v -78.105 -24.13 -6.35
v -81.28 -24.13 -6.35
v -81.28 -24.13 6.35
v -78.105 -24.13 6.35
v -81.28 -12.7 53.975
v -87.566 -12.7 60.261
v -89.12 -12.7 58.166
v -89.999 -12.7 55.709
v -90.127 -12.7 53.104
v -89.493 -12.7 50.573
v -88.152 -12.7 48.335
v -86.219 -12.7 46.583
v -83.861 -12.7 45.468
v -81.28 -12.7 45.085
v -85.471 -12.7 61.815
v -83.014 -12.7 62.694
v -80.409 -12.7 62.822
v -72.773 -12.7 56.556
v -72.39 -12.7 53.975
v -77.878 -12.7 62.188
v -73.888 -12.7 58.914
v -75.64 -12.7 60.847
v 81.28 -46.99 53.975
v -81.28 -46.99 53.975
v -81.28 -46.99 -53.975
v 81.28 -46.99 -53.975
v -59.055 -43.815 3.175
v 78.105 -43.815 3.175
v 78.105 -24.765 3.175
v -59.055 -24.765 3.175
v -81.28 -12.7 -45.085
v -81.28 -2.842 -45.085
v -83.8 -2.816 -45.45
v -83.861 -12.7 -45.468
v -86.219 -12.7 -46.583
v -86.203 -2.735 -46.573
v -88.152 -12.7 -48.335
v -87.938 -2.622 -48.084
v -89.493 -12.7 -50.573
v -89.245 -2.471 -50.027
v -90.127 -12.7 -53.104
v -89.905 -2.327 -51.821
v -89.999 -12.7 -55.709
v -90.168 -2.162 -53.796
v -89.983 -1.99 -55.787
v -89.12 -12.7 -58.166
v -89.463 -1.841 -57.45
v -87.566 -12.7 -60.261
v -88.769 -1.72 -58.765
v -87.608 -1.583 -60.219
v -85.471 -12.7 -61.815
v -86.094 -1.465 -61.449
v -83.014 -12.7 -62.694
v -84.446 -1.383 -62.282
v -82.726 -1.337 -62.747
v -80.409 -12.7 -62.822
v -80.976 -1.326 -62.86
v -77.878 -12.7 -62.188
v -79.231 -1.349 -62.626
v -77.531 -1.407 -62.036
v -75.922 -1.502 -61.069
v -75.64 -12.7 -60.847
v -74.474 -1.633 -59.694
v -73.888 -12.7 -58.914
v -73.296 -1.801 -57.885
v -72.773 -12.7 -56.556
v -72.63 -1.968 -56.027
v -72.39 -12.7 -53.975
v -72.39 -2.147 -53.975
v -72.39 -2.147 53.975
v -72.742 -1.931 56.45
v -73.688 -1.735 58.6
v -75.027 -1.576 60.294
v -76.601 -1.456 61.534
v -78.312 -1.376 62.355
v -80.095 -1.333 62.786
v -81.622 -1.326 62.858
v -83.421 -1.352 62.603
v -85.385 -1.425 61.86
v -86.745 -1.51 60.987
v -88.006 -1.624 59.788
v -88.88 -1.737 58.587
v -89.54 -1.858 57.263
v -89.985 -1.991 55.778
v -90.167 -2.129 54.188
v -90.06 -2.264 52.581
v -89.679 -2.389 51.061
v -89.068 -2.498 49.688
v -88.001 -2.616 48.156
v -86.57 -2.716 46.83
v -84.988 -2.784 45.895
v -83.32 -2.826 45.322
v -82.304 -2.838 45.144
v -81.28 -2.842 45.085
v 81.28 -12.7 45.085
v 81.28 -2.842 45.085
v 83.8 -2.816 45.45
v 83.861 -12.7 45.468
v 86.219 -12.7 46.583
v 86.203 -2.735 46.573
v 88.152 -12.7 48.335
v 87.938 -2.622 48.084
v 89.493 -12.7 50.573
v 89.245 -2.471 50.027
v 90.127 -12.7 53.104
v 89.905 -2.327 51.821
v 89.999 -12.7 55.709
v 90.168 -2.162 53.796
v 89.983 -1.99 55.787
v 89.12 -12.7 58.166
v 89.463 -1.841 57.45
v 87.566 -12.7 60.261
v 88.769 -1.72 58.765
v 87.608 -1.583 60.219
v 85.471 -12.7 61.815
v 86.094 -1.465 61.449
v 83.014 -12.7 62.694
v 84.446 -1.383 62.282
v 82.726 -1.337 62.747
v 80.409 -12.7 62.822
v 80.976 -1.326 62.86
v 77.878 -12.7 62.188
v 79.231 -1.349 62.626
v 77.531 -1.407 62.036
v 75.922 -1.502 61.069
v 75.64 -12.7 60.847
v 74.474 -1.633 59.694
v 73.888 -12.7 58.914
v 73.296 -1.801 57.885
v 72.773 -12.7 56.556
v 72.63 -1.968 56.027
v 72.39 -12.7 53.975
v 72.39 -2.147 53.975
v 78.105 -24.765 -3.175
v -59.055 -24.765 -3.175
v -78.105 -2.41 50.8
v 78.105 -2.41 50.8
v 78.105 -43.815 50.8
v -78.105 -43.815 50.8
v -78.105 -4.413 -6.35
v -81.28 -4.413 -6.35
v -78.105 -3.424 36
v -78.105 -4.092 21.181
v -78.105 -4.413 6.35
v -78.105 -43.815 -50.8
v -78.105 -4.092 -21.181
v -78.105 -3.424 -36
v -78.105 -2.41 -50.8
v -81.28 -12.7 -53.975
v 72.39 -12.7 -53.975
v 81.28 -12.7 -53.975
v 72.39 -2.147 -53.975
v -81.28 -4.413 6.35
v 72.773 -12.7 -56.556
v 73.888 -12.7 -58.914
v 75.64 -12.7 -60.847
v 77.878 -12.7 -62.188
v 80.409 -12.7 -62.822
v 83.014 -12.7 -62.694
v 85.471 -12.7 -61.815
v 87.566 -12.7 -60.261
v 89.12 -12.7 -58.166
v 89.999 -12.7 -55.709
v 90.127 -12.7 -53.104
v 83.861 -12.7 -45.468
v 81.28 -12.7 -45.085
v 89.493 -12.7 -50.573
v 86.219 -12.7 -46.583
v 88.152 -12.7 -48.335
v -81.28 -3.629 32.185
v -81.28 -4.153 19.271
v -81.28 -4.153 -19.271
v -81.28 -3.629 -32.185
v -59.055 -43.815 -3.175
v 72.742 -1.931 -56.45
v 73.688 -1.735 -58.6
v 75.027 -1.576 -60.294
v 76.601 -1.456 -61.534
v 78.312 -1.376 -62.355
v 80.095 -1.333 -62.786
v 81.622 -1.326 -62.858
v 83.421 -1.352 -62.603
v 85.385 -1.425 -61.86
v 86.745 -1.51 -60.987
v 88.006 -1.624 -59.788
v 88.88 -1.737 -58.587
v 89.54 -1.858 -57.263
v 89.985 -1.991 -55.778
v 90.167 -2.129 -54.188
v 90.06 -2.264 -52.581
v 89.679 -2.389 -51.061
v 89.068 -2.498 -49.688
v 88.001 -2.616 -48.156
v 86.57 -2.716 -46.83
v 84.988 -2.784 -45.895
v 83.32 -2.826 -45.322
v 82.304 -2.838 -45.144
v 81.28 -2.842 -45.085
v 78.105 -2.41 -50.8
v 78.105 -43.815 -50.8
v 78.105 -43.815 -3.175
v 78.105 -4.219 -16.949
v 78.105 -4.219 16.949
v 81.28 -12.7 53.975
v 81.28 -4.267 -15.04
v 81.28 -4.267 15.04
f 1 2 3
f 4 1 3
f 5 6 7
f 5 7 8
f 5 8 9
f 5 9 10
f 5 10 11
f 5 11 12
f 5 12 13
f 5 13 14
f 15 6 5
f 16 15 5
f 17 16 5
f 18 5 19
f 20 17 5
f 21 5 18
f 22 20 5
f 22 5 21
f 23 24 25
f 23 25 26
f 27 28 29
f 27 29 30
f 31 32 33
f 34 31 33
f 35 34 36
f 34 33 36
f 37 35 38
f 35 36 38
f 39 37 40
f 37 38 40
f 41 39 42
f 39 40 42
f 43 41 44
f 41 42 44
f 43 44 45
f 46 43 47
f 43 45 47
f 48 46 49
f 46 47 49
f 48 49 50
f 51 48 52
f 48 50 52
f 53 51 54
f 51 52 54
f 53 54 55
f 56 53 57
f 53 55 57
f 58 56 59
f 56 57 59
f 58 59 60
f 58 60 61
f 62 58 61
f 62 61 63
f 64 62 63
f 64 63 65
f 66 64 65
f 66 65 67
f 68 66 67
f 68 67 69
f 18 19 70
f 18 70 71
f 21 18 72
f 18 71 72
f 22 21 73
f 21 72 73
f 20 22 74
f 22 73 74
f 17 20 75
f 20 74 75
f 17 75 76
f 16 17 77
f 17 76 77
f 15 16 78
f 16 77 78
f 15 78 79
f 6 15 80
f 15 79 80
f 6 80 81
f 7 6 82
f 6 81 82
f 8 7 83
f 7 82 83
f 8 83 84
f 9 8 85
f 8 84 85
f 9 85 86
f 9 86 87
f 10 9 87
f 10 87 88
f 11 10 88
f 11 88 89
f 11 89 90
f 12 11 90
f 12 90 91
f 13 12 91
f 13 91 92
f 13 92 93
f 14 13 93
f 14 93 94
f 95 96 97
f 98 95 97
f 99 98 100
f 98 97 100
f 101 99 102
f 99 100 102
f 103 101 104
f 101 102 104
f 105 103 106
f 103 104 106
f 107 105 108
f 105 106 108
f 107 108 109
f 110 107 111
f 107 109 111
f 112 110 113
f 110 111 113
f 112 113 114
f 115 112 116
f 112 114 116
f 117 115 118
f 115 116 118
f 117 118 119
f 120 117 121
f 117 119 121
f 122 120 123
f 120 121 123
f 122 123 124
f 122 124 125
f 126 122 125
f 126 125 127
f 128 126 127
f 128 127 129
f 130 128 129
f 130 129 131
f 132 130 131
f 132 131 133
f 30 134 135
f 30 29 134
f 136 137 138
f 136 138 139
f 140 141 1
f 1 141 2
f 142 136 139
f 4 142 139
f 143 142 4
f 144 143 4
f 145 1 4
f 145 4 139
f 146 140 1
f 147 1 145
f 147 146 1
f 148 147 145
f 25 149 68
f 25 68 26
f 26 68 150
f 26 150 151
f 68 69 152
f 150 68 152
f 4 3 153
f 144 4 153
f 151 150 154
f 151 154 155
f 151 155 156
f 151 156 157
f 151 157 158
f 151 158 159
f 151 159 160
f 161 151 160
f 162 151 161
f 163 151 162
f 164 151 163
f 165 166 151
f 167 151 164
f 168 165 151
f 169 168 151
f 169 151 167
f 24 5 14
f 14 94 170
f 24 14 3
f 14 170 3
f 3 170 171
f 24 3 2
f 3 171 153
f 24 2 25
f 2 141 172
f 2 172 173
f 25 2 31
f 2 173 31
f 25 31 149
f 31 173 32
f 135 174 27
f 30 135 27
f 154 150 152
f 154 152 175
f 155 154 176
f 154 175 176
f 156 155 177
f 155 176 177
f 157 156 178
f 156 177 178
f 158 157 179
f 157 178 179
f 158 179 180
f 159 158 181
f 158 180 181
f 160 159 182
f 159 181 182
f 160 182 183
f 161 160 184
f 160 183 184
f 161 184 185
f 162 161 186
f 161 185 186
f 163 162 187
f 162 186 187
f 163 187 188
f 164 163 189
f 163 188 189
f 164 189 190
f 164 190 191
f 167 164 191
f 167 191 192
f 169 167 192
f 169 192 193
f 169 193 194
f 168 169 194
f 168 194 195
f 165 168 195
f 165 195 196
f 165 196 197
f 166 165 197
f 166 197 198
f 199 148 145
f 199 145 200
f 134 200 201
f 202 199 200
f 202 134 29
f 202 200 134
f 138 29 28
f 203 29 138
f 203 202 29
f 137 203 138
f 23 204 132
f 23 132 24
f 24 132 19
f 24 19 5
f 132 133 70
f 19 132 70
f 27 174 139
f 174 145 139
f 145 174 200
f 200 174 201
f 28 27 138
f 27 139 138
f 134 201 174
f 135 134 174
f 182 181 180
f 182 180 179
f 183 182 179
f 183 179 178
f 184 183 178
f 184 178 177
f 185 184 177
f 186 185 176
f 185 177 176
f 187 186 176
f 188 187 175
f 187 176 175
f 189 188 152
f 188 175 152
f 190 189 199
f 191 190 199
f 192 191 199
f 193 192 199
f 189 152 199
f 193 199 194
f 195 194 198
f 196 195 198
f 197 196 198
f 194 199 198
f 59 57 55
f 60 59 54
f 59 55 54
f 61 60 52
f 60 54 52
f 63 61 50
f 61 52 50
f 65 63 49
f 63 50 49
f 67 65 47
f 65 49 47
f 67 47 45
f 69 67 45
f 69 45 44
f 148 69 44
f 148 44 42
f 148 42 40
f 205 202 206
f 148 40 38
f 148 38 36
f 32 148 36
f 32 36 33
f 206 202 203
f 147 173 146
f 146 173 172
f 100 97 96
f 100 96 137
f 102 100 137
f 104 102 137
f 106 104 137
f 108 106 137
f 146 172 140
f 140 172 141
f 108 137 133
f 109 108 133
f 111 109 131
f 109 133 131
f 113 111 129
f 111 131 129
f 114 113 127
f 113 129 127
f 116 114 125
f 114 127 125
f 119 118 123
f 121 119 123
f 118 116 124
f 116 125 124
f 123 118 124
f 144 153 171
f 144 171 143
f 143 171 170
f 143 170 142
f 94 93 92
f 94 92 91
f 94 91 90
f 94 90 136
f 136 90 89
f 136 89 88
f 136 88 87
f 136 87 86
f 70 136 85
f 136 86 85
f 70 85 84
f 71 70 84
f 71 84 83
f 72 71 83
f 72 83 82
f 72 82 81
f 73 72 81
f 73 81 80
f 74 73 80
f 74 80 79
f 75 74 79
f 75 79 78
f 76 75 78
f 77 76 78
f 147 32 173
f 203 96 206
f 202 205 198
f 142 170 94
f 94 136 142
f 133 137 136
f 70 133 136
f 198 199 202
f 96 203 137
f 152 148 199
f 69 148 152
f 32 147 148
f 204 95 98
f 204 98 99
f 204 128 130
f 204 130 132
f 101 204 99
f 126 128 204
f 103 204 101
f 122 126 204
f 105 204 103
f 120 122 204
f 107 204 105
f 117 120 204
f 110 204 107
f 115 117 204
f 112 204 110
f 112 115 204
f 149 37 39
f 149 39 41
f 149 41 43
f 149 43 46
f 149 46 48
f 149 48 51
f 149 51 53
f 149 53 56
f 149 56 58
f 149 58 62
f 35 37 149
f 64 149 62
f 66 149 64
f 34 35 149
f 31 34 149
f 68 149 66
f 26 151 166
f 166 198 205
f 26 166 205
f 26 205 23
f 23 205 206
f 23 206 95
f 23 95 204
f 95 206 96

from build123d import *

# Parameters (mm, degrees)
F1_DEPTH  = 46.99
F2_T      = -3.175
F5_DEPTH  = 12.7
F6_R      = 635
F7_DEPTH  = 279.4
F8_DEPTH  = 3.175
F9_W      = 137.16
F9_H      = 3.175
F10_DEPTH = 19.05


# Not quite as in the source:
# - a feature names something its author has since deleted; it is built from what else it names


with BuildPart() as f1:
    # F0 (on Front) → F1 (new body)
    with BuildSketch(Plane.XZ):
        Polygon((-72.39, 53.975), (-81.28, 53.975), (-81.28, 45.085), (-81.28, -45.085), (-81.28, -53.975), (-72.39, -53.975), (72.39, -53.975), (81.28, -53.975), (81.28, -45.085), (81.28, 45.085), (81.28, 53.975), (72.39, 53.975), align=None)
    extrude(amount=F1_DEPTH)

    # F2
    f2_openings = [f1.faces().sort_by_distance(p)[0] for p in [
        (0, 0, 0),
    ]]
    offset(amount=F2_T, openings=f2_openings)

    # F0 (on Front) → F5 (join)
    with BuildSketch(Plane.XZ):
        with BuildLine():
            Line((-81.28, 45.085), (-81.28, 53.975))
            Line((-81.28, 53.975), (-72.39, 53.975))
            ThreePointArc((-72.39, 53.975), (-87.5661792847, 60.2611792847), (-81.28, 45.085))
        make_face()
        with BuildLine():
            Line((-81.28, -53.975), (-81.28, -45.085))
            ThreePointArc((-81.28, -45.085), (-87.5661792847, -60.2611792847), (-72.39, -53.975))
            Line((-72.39, -53.975), (-81.28, -53.975))
        make_face()
        with BuildLine():
            ThreePointArc((81.28, 45.085), (87.5661792847, 60.2611792847), (72.39, 53.975))
            Line((72.39, 53.975), (81.28, 53.975))
            Line((81.28, 53.975), (81.28, 45.085))
        make_face()
        with BuildLine():
            ThreePointArc((72.39, -53.975), (87.5661792847, -60.2611792847), (81.28, -45.085))
            Line((81.28, -45.085), (81.28, -53.975))
            Line((81.28, -53.975), (72.39, -53.975))
        make_face()
    extrude(amount=F5_DEPTH)

    # F6 (on offset) → F7 (cut)
    with BuildSketch(Plane(origin=(-106.68, 0, 0), x_dir=(0, -1, 0), z_dir=(-1, 0, 0))):
        with Locations((-630.555, 0)):
            Circle(F6_R)
    extrude(amount=-F7_DEPTH, mode=Mode.SUBTRACT)

    # F4 (on face) → F8 (cut)
    with BuildSketch(Plane(origin=(-81.28, 0, 0), x_dir=(0, -1, 0), z_dir=(-1, 0, 0))):
        Polygon((24.13, 0), (13.97, 0), (3.81, 0), (3.81, -6.35), (24.13, -6.35), align=None)
        Polygon((3.81, 0), (13.97, 0), (24.13, 0), (24.13, 6.35), (3.81, 6.35), align=None)
    extrude(amount=-F8_DEPTH, mode=Mode.SUBTRACT)

    # F9 (on face) → F10 (join)
    with BuildSketch(Plane(origin=(0, -43.815, 0), x_dir=(-1, 0, 0), z_dir=(0, 1, 0))):
        with Locations((-9.525, -1.5875)):
            Rectangle(F9_W, F9_H)
        with Locations((-9.525, 1.5875)):
            Rectangle(F9_W, F9_H)
    extrude(amount=F10_DEPTH)


solid = f1.part
